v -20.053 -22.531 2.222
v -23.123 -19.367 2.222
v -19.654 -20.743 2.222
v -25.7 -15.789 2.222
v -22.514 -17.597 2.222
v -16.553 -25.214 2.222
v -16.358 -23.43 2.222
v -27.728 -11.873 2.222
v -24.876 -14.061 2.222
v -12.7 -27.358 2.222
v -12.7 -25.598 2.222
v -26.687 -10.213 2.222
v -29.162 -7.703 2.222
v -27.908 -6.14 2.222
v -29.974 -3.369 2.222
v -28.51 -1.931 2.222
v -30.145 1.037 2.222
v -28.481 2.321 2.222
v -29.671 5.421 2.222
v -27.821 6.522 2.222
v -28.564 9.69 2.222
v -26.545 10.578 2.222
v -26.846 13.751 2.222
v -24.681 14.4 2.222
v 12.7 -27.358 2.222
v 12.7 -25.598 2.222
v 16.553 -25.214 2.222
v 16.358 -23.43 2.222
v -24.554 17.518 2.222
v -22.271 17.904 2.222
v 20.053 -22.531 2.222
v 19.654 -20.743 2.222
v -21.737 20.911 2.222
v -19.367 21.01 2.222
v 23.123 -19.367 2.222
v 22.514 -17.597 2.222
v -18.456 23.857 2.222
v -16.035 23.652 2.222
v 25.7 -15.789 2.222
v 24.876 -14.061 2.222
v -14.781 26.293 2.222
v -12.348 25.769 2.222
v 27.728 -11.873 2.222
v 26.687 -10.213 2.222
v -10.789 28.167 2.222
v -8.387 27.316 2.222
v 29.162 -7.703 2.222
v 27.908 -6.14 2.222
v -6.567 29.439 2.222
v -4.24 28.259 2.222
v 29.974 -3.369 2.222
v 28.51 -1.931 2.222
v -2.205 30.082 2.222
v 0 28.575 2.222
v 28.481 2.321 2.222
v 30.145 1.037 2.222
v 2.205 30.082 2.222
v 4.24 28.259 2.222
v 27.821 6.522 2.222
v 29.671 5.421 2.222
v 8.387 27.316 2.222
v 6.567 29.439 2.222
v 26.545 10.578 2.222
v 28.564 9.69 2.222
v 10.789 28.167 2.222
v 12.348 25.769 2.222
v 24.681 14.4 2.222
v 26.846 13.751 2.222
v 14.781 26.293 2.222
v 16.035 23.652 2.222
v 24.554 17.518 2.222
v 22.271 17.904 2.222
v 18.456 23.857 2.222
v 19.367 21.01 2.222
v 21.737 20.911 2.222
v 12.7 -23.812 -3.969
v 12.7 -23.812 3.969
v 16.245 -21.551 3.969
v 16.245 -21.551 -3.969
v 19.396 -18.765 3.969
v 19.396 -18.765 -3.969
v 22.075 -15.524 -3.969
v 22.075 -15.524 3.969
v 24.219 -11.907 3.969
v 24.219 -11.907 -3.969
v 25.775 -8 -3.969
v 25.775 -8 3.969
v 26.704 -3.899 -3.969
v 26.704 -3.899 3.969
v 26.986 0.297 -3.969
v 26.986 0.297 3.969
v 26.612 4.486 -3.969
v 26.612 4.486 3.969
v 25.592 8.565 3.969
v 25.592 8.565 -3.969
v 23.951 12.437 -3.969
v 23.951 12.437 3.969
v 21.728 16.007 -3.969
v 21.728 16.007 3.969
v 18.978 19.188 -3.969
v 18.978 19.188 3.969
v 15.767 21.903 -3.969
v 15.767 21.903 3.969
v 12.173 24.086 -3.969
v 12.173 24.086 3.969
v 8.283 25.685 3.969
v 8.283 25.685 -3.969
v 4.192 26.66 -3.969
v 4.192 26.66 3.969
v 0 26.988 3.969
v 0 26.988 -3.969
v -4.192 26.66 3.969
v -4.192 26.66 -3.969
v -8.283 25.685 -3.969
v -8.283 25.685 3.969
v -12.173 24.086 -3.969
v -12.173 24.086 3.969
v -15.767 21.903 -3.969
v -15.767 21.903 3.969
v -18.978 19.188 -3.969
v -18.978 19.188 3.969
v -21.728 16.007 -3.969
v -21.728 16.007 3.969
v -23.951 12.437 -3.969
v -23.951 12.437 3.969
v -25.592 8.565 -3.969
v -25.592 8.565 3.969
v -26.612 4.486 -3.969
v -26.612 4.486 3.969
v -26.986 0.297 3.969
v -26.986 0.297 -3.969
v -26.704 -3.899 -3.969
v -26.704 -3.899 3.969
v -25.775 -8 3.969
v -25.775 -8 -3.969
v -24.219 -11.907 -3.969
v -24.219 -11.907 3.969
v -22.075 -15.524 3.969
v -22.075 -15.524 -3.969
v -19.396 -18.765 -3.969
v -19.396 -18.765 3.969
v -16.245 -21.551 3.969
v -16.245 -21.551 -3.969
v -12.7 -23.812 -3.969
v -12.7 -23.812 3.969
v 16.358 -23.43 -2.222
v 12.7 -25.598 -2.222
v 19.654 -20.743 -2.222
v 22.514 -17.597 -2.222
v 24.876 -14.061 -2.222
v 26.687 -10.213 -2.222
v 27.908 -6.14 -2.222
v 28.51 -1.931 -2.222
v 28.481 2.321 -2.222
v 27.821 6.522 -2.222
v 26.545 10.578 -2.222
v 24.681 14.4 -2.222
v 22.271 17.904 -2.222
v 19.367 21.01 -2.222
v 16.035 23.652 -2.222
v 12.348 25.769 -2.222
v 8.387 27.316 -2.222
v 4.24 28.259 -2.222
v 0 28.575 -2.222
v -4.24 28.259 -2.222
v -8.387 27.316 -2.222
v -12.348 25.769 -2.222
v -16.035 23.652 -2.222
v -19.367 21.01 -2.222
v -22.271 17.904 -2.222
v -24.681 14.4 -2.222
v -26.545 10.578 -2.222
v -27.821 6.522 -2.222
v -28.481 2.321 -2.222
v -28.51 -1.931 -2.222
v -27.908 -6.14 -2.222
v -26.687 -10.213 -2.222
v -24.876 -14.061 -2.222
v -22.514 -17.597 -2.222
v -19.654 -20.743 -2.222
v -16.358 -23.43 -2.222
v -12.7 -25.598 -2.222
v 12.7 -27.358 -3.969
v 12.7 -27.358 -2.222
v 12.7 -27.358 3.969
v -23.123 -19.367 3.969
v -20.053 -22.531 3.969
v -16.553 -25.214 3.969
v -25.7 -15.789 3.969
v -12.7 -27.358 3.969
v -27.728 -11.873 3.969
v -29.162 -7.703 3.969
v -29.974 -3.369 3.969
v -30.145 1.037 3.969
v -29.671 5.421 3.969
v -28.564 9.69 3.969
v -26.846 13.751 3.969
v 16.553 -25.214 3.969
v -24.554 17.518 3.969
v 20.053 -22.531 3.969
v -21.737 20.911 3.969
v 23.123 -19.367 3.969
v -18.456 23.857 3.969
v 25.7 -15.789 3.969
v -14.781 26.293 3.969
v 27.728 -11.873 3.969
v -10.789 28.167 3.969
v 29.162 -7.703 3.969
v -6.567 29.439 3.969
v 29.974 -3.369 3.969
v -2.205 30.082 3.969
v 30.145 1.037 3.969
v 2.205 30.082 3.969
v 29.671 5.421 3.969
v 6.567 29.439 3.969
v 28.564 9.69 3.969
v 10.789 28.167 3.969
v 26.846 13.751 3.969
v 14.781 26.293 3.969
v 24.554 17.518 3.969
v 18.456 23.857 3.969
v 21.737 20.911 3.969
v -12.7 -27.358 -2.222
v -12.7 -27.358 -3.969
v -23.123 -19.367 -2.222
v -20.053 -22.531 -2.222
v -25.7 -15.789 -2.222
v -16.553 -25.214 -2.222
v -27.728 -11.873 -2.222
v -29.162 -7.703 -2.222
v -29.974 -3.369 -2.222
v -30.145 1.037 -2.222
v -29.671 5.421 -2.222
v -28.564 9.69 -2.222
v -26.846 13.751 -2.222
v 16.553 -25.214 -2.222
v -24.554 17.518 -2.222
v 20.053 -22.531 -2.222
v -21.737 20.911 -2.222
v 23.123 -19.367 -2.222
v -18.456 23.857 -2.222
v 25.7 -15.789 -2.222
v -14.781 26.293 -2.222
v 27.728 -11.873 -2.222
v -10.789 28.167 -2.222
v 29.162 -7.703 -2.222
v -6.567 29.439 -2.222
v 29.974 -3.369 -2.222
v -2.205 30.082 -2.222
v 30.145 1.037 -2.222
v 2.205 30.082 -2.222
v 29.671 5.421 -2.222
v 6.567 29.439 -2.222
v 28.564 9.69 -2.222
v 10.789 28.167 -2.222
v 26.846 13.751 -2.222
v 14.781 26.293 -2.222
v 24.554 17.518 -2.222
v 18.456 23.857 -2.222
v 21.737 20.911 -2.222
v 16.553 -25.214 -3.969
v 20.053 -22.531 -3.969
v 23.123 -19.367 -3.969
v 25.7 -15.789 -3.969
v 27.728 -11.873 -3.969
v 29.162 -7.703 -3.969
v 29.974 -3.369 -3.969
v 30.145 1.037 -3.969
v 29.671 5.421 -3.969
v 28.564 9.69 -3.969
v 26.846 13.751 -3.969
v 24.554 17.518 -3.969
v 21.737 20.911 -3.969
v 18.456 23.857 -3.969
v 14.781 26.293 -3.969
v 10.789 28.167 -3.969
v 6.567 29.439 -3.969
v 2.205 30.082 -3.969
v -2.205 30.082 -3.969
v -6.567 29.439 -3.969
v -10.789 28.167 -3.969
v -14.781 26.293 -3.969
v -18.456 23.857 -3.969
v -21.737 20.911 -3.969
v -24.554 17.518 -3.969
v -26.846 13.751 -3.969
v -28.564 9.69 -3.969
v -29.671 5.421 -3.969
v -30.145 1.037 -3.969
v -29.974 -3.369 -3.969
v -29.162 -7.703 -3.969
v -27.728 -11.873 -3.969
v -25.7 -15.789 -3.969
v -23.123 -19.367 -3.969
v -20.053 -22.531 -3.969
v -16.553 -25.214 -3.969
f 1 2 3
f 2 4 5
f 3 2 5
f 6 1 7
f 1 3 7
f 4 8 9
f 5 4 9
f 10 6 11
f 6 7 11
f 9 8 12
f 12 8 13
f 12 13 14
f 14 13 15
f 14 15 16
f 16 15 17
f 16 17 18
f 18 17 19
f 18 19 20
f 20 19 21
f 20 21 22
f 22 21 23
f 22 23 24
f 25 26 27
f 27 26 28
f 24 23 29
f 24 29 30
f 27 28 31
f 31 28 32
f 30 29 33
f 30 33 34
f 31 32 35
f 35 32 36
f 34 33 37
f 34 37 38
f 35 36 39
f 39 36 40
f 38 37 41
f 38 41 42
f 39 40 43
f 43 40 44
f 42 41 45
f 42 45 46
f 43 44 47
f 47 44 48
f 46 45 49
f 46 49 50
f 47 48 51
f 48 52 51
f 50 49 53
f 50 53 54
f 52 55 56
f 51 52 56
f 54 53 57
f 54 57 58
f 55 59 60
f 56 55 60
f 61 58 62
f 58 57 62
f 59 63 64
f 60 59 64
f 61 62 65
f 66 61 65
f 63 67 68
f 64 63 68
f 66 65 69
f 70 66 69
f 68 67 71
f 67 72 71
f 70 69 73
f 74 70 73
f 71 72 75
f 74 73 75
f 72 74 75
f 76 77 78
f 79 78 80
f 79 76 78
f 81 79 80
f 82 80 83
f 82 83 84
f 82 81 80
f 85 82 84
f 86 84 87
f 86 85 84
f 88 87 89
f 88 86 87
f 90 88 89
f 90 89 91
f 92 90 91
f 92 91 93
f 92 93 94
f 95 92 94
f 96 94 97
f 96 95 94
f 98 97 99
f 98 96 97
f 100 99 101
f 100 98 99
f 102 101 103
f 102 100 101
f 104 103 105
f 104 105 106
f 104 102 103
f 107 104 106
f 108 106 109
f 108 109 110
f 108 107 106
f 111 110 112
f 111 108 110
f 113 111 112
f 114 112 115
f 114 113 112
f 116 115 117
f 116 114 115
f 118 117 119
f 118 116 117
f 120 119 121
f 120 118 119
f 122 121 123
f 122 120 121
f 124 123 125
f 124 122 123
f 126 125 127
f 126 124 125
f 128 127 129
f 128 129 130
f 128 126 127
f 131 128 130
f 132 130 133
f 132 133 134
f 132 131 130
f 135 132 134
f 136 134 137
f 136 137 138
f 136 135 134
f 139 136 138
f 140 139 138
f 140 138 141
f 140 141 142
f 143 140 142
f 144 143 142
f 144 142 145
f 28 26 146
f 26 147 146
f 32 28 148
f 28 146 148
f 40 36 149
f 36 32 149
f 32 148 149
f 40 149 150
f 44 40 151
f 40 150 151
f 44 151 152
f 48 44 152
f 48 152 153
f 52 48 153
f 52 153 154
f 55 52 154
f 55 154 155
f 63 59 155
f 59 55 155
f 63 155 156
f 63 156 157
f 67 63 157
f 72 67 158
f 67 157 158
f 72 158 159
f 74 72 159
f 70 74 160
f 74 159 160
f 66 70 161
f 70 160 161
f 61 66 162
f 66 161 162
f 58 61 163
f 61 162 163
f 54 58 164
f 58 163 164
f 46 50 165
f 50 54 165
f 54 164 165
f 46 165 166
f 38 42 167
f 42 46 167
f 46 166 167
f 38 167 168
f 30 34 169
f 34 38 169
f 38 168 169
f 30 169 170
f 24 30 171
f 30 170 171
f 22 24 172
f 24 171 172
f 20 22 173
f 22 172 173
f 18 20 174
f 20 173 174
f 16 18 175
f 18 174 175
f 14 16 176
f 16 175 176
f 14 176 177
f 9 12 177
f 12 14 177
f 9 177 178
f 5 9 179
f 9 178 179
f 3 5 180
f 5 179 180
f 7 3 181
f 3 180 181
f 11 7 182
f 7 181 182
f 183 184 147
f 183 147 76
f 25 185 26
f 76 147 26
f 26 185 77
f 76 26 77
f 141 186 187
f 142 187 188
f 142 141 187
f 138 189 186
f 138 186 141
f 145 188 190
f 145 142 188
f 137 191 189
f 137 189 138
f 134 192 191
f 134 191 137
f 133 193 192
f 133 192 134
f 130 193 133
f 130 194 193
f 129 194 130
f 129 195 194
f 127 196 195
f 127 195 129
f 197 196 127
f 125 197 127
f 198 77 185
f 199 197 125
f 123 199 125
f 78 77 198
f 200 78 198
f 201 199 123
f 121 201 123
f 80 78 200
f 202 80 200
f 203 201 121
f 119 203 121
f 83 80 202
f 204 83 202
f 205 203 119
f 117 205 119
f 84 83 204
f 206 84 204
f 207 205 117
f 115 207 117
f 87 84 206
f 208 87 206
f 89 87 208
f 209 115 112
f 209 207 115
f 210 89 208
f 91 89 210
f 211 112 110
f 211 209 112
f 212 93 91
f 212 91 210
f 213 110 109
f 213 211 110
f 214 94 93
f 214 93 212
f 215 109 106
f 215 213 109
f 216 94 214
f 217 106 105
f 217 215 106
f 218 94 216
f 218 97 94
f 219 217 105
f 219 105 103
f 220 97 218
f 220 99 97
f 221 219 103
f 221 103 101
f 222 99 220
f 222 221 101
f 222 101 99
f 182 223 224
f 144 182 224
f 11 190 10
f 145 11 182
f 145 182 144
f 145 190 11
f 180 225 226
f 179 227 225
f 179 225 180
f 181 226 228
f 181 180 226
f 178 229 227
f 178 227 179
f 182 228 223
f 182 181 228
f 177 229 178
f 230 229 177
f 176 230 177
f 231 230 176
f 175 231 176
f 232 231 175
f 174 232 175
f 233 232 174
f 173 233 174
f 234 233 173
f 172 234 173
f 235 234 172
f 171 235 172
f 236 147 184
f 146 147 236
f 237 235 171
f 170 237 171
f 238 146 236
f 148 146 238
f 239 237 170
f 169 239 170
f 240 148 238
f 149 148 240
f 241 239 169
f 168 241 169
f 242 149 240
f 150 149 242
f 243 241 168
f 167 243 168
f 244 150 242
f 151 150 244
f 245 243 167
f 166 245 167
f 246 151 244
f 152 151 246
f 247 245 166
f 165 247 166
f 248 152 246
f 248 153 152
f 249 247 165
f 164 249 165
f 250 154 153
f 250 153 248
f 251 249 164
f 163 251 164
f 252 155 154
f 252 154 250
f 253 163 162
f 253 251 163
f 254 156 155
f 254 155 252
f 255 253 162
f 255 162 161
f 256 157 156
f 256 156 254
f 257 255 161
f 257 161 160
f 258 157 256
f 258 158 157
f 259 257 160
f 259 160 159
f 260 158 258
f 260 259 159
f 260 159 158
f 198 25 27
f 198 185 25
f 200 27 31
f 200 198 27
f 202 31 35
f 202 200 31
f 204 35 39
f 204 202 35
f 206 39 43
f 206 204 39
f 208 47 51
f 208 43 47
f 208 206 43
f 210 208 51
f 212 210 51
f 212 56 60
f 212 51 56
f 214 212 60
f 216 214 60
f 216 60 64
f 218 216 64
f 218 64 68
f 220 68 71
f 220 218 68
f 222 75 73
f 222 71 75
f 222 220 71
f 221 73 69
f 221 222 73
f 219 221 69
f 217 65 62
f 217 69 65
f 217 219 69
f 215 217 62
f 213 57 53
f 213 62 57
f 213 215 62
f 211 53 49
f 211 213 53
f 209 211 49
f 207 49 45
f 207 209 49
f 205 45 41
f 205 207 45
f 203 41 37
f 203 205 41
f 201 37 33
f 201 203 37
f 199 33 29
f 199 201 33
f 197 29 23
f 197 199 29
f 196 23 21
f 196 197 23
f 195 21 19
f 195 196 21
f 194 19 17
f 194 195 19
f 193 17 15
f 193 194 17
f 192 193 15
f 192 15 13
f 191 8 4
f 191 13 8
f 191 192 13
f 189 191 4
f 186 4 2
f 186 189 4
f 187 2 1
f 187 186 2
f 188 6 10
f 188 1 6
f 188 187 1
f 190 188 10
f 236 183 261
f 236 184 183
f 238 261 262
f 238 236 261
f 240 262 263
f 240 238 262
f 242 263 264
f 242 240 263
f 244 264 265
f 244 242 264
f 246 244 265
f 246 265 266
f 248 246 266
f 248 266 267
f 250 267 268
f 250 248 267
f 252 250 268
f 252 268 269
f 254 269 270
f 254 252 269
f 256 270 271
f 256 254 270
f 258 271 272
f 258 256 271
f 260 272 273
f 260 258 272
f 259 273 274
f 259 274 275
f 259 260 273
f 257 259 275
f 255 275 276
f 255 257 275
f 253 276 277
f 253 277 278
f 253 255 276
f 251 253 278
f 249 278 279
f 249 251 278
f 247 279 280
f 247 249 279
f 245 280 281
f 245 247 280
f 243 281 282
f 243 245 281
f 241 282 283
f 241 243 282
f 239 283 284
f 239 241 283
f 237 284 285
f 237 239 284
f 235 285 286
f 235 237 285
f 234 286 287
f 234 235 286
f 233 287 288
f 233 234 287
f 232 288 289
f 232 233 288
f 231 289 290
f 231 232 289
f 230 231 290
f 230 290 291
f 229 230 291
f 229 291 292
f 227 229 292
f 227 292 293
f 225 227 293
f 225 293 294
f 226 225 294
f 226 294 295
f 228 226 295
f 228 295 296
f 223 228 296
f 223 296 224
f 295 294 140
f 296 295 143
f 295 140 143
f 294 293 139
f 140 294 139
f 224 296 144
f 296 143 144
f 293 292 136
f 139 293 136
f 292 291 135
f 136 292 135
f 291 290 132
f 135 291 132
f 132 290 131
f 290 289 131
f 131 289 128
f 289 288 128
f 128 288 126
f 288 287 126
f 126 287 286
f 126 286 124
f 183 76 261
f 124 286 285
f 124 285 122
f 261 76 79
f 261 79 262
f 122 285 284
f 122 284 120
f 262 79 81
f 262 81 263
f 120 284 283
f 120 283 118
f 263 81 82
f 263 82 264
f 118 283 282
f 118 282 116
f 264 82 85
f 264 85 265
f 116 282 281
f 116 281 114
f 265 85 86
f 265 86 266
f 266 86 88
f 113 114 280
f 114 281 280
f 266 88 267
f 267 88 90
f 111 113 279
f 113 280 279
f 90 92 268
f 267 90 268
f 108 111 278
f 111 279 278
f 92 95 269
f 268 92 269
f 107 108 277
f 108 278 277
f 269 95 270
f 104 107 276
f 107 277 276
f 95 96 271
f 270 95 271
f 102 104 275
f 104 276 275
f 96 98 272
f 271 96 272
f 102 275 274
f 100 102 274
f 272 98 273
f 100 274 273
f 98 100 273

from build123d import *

# Parameters (mm, degrees)
F0_R     = 30.1625
F0_R_2   = 26.9875
F1_DEPTH = 3.96875
F2_R     = 36.329519
F2_R_2   = 28.575
F3_DEPTH = 2.2225
F4_W     = 25.4
F4_H     = 40.857697
F5_DEPTH = 12.7


with BuildPart() as f1:
    # F0 (on Top) → F1 (new body, symmetric)
    with BuildSketch(Plane.XY):
        Circle(F0_R)
        Circle(F0_R_2, mode=Mode.SUBTRACT)
    extrude(amount=F1_DEPTH, both=True)

    # F2 (on Top) → F3 (cut, symmetric)
    with BuildSketch(Plane.XY):
        Circle(F2_R)
        Circle(F2_R_2, mode=Mode.SUBTRACT)
    extrude(amount=F3_DEPTH, both=True, mode=Mode.SUBTRACT)

    # F4 (on Top) → F5 (cut, symmetric)
    with BuildSketch(Plane.XY):
        with Locations((0, -20.428848)):
            Rectangle(F4_W, F4_H)
    extrude(amount=F5_DEPTH, both=True, mode=Mode.SUBTRACT)


solid = f1.part
